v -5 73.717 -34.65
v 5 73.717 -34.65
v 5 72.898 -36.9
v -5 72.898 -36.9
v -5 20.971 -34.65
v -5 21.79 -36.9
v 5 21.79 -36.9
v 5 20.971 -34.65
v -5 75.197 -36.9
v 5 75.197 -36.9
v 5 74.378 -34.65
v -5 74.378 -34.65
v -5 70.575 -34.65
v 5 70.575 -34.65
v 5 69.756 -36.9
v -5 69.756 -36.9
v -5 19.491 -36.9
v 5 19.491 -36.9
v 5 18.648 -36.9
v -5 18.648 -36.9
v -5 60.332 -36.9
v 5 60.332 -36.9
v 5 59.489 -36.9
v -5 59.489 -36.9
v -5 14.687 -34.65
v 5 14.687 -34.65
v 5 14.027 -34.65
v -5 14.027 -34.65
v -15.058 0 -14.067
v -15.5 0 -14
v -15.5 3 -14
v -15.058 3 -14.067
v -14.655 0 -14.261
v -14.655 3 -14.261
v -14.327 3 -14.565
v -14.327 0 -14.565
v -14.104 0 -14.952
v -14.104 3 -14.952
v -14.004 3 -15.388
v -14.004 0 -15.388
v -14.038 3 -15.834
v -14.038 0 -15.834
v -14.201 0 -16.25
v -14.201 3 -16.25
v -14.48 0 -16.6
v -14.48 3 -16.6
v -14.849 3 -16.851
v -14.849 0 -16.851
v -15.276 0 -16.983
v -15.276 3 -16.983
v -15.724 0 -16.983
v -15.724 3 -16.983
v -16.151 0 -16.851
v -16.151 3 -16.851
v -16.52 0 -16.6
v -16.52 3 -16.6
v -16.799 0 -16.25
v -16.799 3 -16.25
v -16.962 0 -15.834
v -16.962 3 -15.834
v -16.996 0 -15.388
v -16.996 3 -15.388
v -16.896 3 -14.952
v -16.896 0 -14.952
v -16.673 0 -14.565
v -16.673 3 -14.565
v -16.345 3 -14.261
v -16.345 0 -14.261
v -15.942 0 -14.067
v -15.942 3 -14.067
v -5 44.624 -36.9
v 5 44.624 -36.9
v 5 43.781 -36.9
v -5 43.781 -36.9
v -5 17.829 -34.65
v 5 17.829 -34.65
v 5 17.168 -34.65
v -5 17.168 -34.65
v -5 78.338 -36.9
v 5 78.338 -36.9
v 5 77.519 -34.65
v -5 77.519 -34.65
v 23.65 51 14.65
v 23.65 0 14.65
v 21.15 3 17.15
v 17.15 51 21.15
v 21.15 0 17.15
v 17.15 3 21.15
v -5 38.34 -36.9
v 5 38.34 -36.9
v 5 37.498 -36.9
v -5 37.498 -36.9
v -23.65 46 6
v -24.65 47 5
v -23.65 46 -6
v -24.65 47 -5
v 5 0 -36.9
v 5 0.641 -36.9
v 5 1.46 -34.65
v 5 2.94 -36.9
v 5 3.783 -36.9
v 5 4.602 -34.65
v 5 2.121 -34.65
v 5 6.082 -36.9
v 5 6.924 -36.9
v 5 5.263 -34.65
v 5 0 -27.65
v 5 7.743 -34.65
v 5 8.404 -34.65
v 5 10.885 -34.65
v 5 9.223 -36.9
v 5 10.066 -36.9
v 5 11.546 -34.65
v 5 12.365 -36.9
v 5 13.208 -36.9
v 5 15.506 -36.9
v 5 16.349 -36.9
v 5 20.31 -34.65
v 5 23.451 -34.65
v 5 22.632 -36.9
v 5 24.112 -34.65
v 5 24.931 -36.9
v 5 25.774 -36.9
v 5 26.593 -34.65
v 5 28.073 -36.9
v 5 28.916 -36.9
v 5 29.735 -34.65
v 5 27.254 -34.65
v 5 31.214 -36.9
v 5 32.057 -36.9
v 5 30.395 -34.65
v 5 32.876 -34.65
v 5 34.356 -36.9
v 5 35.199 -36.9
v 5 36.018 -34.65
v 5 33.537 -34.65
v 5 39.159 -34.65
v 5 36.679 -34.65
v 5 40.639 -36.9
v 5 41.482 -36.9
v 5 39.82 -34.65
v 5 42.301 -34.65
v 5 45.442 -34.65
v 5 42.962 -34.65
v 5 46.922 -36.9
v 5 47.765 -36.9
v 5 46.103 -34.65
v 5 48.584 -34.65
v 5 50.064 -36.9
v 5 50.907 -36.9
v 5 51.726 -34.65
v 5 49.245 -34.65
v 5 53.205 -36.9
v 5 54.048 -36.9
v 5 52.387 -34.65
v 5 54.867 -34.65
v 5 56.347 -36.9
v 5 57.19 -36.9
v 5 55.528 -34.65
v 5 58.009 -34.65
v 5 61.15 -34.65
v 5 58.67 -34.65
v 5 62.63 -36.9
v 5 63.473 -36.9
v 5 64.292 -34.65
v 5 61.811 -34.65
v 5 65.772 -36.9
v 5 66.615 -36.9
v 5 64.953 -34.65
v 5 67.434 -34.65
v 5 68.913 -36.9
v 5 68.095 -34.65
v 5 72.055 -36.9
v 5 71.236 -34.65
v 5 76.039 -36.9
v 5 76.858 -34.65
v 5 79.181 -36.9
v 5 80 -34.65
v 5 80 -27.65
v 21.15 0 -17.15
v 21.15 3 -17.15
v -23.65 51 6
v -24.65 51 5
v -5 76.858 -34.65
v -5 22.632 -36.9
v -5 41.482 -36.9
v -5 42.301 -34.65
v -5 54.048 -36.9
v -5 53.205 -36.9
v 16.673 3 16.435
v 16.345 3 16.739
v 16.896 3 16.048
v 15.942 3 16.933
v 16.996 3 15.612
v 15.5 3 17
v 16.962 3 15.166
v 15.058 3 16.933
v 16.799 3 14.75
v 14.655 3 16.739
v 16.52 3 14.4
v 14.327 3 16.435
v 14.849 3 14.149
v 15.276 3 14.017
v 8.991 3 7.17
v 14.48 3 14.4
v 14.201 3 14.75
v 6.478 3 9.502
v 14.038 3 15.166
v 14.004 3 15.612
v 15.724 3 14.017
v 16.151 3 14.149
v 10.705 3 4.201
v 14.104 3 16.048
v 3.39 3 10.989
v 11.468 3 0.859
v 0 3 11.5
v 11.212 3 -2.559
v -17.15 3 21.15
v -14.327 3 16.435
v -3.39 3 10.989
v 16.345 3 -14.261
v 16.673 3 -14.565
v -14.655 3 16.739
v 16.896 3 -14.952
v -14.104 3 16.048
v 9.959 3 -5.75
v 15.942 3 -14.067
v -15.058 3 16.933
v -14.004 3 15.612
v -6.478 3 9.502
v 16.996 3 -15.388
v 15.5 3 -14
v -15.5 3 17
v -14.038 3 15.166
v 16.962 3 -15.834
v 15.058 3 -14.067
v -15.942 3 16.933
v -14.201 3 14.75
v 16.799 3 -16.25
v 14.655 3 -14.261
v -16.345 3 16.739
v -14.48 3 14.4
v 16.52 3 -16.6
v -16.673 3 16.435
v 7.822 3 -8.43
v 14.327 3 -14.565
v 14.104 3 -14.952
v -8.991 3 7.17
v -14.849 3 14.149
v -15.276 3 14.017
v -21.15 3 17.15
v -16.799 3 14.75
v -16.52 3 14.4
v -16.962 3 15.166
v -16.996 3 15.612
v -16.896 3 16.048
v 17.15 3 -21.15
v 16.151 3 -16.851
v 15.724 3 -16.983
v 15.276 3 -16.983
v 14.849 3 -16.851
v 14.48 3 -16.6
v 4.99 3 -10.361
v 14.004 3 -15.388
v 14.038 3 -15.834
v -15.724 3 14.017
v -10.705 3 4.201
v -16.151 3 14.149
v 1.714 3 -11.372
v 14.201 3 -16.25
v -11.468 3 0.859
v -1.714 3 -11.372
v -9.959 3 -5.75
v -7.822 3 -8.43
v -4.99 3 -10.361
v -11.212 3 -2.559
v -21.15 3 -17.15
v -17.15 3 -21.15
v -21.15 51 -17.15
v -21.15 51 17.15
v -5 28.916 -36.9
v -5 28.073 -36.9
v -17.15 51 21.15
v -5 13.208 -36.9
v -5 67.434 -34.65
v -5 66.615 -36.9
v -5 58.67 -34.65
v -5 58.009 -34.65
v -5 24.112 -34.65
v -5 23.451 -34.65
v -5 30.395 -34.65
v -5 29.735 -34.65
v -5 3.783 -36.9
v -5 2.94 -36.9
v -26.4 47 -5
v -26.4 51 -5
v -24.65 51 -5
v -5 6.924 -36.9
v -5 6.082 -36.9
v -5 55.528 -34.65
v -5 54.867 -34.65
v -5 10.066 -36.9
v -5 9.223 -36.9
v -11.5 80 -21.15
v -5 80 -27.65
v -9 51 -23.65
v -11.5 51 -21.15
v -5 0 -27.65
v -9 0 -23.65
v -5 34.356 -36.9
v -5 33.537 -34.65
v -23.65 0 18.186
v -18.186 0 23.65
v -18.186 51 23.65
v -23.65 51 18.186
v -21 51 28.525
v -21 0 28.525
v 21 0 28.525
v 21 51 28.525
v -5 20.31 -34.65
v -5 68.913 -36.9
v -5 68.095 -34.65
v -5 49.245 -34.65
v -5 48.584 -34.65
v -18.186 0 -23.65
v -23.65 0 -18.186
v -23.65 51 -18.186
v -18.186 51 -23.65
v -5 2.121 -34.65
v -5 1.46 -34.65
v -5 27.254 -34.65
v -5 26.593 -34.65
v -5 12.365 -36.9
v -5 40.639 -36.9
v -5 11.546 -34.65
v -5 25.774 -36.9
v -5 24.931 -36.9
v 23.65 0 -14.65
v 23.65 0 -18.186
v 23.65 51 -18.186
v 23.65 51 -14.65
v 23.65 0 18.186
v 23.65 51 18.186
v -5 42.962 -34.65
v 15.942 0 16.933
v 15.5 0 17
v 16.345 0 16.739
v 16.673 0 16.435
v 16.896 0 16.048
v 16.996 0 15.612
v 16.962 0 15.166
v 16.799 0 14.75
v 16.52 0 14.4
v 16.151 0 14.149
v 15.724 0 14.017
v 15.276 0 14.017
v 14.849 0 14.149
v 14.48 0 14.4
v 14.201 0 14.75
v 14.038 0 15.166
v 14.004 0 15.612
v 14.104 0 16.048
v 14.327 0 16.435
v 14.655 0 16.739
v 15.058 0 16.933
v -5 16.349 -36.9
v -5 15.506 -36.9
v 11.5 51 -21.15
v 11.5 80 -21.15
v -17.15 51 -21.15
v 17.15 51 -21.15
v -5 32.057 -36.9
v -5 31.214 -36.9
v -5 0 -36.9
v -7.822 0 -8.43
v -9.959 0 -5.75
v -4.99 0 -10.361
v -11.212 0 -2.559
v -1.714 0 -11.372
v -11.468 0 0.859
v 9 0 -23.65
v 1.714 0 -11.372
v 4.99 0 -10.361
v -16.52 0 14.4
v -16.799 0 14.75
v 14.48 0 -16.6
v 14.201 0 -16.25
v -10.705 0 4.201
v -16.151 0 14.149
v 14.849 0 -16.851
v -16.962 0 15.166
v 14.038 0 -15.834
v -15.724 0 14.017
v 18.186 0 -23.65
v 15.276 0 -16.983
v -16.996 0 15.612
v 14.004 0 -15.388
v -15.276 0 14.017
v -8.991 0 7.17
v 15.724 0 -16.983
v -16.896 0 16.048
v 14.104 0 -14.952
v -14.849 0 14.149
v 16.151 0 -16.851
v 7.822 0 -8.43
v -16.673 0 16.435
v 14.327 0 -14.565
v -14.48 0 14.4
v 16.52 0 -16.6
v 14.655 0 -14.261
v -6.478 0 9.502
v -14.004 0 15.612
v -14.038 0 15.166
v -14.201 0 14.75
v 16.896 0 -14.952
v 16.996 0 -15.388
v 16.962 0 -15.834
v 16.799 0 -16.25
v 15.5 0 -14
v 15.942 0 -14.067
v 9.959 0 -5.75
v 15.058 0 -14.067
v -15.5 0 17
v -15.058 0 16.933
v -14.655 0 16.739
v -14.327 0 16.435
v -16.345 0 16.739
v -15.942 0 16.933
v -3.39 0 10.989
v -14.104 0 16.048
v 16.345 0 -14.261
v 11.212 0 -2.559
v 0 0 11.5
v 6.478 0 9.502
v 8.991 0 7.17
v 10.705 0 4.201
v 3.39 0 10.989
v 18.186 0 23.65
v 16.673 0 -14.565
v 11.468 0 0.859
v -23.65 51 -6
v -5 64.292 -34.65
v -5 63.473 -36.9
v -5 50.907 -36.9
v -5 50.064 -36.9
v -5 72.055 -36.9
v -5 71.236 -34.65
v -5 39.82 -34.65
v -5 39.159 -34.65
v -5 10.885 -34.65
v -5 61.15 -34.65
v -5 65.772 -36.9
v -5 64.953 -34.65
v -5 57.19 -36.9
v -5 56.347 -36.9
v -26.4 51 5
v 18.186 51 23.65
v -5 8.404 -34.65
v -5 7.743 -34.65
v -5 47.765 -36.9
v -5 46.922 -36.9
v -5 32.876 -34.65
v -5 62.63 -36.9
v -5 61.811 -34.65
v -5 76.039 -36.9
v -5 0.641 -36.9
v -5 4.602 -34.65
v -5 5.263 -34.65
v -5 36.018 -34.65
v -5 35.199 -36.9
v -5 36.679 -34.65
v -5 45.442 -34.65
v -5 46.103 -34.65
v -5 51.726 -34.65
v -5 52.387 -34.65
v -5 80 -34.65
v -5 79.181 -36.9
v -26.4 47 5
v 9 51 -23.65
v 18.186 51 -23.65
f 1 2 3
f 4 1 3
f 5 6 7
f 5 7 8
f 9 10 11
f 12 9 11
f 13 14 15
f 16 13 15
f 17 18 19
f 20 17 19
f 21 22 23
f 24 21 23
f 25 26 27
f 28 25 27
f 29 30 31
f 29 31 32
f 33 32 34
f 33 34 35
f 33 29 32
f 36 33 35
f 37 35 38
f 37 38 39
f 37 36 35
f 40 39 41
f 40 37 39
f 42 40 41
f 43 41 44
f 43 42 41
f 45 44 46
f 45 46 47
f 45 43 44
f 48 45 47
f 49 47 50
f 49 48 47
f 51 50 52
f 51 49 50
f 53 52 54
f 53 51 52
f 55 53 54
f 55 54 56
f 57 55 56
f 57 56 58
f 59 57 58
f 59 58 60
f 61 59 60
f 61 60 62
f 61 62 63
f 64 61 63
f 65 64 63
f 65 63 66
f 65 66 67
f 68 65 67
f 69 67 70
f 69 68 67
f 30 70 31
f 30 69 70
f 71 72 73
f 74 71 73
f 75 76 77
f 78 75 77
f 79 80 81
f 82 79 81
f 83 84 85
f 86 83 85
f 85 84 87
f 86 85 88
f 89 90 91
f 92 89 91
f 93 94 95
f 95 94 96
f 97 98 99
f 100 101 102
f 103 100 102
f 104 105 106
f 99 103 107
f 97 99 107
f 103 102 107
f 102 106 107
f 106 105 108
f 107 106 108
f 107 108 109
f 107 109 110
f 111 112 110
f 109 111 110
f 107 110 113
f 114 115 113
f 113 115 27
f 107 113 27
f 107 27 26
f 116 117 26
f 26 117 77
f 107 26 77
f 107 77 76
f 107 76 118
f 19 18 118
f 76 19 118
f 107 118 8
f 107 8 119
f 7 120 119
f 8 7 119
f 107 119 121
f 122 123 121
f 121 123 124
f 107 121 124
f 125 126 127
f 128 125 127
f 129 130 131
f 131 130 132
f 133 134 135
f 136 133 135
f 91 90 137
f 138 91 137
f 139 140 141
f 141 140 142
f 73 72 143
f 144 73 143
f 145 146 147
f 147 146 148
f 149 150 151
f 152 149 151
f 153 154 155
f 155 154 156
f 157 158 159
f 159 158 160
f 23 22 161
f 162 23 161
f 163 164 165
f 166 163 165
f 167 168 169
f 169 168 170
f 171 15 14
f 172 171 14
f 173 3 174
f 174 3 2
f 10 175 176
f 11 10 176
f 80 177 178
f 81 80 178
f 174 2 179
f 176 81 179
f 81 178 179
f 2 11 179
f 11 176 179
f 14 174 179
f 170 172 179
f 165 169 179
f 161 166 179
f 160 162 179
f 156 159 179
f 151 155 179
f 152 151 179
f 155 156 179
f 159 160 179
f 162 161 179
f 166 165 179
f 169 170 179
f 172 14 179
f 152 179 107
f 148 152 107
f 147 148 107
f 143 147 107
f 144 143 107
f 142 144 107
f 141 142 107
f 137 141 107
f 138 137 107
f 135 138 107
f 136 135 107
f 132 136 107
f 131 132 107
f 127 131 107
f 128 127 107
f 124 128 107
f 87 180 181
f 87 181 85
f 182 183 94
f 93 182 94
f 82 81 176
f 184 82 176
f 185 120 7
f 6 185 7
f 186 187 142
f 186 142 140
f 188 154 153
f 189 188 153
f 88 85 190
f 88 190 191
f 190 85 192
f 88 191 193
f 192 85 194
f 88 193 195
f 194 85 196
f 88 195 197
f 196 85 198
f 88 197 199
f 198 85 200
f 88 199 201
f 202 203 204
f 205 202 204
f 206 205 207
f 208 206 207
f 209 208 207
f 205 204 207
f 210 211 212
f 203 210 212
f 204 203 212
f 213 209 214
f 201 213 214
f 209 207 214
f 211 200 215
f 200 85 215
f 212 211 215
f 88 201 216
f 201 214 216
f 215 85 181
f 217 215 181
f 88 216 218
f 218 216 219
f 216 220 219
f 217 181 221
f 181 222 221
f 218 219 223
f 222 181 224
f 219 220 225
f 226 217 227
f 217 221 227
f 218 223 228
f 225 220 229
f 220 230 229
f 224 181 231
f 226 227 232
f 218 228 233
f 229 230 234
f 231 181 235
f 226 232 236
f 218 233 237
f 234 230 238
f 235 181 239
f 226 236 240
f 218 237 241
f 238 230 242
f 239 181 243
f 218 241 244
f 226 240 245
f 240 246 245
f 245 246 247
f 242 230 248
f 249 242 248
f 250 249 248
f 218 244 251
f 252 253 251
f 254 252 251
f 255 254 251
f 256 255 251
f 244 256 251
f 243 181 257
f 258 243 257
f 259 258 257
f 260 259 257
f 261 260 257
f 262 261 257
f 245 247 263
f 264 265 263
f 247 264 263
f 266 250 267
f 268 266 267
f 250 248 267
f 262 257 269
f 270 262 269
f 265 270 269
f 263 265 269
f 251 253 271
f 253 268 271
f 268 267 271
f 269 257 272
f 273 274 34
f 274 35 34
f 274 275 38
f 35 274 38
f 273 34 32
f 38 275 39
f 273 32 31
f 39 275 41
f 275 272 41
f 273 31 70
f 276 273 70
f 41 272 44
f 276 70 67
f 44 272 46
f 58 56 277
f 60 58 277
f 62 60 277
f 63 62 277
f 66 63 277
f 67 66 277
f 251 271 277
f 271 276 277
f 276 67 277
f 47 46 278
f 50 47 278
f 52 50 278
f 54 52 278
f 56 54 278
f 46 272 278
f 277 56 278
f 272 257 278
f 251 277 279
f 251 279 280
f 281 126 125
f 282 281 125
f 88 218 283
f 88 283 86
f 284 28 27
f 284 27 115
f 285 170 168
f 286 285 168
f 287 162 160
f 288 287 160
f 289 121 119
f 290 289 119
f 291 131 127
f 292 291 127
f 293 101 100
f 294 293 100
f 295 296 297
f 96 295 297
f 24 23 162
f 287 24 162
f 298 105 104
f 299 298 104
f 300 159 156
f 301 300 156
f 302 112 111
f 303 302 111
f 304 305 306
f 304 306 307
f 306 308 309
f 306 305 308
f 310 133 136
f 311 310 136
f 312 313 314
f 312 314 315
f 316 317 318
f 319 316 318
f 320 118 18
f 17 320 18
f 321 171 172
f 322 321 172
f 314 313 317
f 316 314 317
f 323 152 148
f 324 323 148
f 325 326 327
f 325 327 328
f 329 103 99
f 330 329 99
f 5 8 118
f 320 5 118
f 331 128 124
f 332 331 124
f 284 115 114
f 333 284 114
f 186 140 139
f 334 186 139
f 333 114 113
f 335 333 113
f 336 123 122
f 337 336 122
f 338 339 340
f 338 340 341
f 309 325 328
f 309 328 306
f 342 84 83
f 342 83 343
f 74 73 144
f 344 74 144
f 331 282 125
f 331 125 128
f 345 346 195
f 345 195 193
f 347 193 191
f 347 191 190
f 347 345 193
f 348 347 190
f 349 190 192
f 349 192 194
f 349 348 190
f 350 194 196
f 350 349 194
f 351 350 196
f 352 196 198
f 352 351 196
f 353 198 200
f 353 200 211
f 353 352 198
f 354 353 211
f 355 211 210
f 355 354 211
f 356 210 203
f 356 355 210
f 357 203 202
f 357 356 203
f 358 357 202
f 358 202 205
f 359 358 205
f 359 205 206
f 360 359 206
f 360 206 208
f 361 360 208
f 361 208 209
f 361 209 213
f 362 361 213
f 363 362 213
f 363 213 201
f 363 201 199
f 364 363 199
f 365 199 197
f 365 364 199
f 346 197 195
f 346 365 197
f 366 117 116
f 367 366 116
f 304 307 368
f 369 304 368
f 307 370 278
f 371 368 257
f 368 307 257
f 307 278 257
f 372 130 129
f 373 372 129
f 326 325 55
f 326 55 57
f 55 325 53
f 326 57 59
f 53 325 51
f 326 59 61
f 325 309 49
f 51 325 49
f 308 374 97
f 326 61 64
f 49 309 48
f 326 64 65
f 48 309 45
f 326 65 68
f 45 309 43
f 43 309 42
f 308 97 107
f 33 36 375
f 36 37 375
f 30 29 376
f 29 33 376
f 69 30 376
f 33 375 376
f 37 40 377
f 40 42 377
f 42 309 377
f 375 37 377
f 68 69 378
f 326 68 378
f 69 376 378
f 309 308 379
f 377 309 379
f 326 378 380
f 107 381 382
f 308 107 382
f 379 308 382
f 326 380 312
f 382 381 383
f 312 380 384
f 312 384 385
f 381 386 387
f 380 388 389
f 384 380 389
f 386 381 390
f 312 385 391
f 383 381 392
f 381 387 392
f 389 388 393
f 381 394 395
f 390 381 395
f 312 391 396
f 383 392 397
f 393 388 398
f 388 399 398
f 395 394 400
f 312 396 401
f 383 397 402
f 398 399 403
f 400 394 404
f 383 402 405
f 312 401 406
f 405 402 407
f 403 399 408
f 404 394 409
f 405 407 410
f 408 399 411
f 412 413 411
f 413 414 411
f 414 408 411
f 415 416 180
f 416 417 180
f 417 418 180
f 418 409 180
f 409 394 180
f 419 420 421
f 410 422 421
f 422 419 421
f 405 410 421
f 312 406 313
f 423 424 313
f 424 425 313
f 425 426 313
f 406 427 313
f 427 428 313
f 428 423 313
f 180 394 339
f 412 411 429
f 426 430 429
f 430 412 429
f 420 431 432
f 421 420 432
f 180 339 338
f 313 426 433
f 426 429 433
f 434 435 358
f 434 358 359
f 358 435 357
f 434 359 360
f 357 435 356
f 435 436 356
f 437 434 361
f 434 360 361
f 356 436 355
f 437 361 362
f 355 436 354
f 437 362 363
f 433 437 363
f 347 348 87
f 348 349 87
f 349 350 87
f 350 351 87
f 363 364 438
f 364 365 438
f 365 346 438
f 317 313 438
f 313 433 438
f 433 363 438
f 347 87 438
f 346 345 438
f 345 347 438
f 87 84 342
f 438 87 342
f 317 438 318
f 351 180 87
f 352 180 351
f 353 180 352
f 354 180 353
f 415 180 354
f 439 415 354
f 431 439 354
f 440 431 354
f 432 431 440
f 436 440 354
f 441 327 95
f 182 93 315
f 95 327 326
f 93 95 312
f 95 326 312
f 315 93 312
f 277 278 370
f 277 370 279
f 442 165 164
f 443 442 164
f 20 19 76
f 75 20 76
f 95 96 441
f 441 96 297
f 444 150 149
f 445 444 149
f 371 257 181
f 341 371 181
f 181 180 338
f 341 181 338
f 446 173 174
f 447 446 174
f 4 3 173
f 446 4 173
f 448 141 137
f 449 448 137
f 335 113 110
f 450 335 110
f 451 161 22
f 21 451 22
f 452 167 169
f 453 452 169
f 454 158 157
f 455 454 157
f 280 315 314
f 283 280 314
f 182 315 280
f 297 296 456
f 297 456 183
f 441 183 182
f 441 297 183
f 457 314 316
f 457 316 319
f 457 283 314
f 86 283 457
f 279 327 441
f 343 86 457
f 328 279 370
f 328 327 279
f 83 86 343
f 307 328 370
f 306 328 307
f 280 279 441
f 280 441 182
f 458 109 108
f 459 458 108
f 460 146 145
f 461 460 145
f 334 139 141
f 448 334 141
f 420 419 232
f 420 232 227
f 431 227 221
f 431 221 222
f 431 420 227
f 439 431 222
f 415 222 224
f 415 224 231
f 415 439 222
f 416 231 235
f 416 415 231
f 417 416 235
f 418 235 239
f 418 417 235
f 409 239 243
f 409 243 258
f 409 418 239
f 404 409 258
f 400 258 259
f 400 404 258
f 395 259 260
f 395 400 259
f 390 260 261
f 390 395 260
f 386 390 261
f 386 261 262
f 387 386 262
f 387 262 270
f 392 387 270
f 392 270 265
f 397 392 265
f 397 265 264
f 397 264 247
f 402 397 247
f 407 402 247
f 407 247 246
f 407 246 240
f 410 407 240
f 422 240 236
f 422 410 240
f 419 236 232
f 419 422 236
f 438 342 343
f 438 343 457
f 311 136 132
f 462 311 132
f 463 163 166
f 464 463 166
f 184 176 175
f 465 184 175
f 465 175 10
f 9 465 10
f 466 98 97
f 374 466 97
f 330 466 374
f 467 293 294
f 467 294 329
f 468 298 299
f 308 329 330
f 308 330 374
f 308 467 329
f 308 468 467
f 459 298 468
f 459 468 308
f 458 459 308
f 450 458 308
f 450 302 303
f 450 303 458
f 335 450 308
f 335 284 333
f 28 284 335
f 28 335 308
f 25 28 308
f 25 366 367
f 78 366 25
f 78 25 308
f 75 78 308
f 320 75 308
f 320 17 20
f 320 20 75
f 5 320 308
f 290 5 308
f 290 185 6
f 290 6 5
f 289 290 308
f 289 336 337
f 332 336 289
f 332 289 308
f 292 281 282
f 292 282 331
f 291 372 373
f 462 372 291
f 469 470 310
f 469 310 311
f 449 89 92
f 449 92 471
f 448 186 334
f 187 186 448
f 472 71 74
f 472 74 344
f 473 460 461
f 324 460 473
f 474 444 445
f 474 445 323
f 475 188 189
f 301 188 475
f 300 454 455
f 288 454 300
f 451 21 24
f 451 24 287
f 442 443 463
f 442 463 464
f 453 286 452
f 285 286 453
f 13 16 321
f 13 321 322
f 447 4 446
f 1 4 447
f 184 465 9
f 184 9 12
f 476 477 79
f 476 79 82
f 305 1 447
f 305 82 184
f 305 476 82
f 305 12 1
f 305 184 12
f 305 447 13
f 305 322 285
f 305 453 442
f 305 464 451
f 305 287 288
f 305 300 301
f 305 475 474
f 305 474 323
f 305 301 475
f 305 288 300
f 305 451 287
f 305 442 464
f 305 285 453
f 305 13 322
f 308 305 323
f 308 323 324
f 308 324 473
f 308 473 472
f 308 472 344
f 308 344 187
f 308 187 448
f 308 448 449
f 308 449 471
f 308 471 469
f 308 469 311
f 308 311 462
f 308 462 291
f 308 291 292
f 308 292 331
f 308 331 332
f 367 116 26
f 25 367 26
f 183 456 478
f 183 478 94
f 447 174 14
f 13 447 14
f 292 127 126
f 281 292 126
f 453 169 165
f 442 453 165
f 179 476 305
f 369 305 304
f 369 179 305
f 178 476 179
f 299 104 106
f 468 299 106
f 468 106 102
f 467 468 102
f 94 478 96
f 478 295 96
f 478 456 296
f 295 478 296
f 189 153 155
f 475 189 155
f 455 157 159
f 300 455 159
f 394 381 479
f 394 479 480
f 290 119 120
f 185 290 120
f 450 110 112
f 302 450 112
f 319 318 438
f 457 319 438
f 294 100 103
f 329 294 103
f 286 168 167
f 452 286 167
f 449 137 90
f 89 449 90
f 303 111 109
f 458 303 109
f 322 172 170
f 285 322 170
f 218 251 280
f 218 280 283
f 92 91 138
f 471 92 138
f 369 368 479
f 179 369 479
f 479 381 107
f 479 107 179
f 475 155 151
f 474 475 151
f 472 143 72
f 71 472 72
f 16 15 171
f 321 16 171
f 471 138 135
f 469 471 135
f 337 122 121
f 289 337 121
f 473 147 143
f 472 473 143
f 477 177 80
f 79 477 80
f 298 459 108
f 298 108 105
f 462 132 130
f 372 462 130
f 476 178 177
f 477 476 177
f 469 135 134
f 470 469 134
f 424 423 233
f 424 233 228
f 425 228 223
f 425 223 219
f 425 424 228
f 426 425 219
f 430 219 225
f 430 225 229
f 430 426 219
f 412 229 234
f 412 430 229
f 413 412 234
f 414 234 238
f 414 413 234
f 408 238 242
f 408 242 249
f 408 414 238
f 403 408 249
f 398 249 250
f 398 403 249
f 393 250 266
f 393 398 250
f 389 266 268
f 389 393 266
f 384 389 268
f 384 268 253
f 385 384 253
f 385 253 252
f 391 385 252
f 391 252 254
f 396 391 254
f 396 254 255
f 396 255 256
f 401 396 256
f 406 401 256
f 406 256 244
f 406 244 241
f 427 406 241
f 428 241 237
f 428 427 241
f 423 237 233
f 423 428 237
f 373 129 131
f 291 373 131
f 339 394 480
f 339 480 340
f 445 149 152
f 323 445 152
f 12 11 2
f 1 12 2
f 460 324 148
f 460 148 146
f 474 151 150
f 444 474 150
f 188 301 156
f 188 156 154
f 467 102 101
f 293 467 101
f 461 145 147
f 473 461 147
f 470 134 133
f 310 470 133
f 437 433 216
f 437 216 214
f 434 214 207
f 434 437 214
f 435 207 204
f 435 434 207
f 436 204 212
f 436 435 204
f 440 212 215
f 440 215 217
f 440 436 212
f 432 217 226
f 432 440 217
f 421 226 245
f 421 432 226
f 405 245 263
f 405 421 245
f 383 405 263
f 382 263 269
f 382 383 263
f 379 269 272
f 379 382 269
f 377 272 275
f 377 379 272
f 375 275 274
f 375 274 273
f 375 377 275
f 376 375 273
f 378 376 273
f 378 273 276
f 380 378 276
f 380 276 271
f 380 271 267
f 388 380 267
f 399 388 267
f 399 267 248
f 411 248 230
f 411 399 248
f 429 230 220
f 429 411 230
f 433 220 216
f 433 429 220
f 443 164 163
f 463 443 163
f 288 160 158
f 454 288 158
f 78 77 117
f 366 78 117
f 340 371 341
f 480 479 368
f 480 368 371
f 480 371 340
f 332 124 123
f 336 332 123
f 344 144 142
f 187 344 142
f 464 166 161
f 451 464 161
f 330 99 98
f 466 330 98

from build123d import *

# Parameters (mm, degrees)
SKETCH1_R           = 1.5
SKETCH1_R_2         = 11.5
BOSS_EXTRUDE1_DEPTH = 3
BOSS_EXTRUDE2_DEPTH = 51
BOSS_EXTRUDE3_DEPTH = 51
SKETCH11_W          = 1
SKETCH11_H          = 51
BOSS_EXTRUDE4_DEPTH = 5
BOSS_EXTRUDE6_DEPTH = 10
CHAMFER1_SIZE       = 4
BOSS_EXTRUDE7_DEPTH = 29
SKETCH16_W          = 2.75
SKETCH16_H          = 10
BOSS_EXTRUDE8_DEPTH = 4
CHAMFER2_SIZE       = 1
CHAMFER3_SIZE       = 1


with BuildPart() as part:
    # Sketch1 → Boss-Extrude1 (new body)
    with BuildSketch(Plane(origin=(0, 0, 0), x_dir=(1, 0, 0), z_dir=(0, 1, 0))):
        Polygon((-21.15, 17.15), (-17.15, 21.15), (17.15, 21.15), (21.15, 17.15), (21.15, -17.15), (17.15, -21.15), (-17.15, -21.15), (-21.15, -17.15), align=None)
        with Locations(Location((-15.5, 15.5, 0), (0, 0, 270))):
            Circle(SKETCH1_R, mode=Mode.SUBTRACT)
        with Locations(Location((15.5, 15.5, 0), (0, 0, 270))):
            Circle(SKETCH1_R, mode=Mode.SUBTRACT)
        with Locations(Location((15.5, -15.5, 0), (0, 0, 270))):
            Circle(SKETCH1_R, mode=Mode.SUBTRACT)
        with Locations(Location((-15.5, -15.5, 0), (0, 0, 270))):
            Circle(SKETCH1_R, mode=Mode.SUBTRACT)
        with Locations(Location((0, 0, 0), (0, 0, 270))):
            Circle(SKETCH1_R_2, mode=Mode.SUBTRACT)
    extrude(amount=BOSS_EXTRUDE1_DEPTH)

    # Sketch5 → Boss-Extrude2 (add)
    with BuildSketch(Plane(origin=(0, 0, 0), x_dir=(1, 0, 0), z_dir=(0, 1, 0))):
        Polygon((21.15, -17.15), (23.65, -14.65), (23.65, -18.185533906), (18.185533906, -23.65), (-18.185533906, -23.65), (-23.65, -18.185533906), (-23.65, 14.65), (-23.65, 18.185533906), (-18.185533906, 23.65), (18.185533906, 23.65), (23.65, 18.185533906), (23.65, 14.65), (21.15, 17.15), (17.15, 21.15), (-17.15, 21.15), (-21.15, 17.15), (-21.15, -17.15), (-17.15, -21.15), (17.15, -21.15), align=None)
    extrude(amount=BOSS_EXTRUDE2_DEPTH)

    # Sketch9 → Boss-Extrude3 (add)
    with BuildSketch(Plane(origin=(0, 0, 0), x_dir=(1, 0, 0), z_dir=(0, 1, 0))):
        Polygon((-18.185533906, -23.65), (-21, -28.524798271), (21, -28.524798271), (18.185533906, -23.65), align=None)
    extrude(amount=BOSS_EXTRUDE3_DEPTH)

    # Sketch11 → Boss-Extrude4 (add, symmetric)
    with BuildSketch(Plane(origin=(0, 0, 0), x_dir=(0, 0, -1), z_dir=(1, 0, 0))):
        with Locations((24.15, 25.5)):
            Rectangle(SKETCH11_W, SKETCH11_H)
    extrude(amount=BOSS_EXTRUDE4_DEPTH, both=True)

    # Sketch13 → Boss-Extrude6 (add)
    with BuildSketch(Plane(origin=(5, 0, 0), x_dir=(0, 0, -1), z_dir=(1, 0, 0))):
        Polygon((24.65, 80), (34.65, 80), (36.9, 79.181067), (36.9, 78.3382111), (34.65, 77.5192781), (34.65, 76.8584073), (36.9, 76.0394743), (36.9, 75.1966185), (34.65, 74.3776854), (34.65, 73.7168147), (36.9, 72.8978817), (36.9, 72.0550258), (34.65, 71.2360928), (34.65, 70.575222), (36.9, 69.756289), (36.9, 68.9134332), (34.65, 68.0945001), (34.65, 67.4336294), (36.9, 66.6146964), (36.9, 65.7718405), (34.65, 64.9529075), (34.65, 64.2920367), (36.9, 63.4731037), (36.9, 62.6302478), (34.65, 61.8113148), (34.65, 61.1504441), (36.9, 60.3315111), (36.9, 59.4886552), (34.65, 58.6697222), (34.65, 58.0088514), (36.9, 57.1899184), (36.9, 56.3470625), (34.65, 55.5281295), (34.65, 54.8672588), (36.9, 54.0483257), (36.9, 53.2054699), (34.65, 52.3865369), (34.65, 51.7256661), (36.9, 50.9067331), (36.9, 50.0638772), (34.65, 49.2449442), (34.65, 48.5840735), (36.9, 47.7651404), (36.9, 46.9222846), (34.65, 46.1033516), (34.65, 45.4424808), (36.9, 44.6235478), (36.9, 43.7806919), (34.65, 42.9617589), (34.65, 42.3008882), (36.9, 41.4819551), (36.9, 40.6390993), (34.65, 39.8201662), (34.65, 39.1592955), (36.9, 38.3403625), (36.9, 37.4975066), (34.65, 36.6785736), (34.65, 36.0177028), (36.9, 35.1987698), (36.9, 34.355914), (34.65, 33.5369809), (34.65, 32.8761102), (36.9, 32.0571772), (36.9, 31.2143213), (34.65, 30.3953883), (34.65, 29.7345175), (36.9, 28.9155845), (36.9, 28.0727287), (34.65, 27.2537956), (34.65, 26.5929249), (36.9, 25.7739919), (36.9, 24.931136), (34.65, 24.112203), (34.65, 23.4513322), (36.9, 22.6323992), (36.9, 21.7895434), (34.65, 20.9706103), (34.65, 20.3097396), (36.9, 19.4908066), (36.9, 18.6479507), (34.65, 17.8290177), (34.65, 17.1681469), (36.9, 16.3492139), (36.9, 15.506358), (34.65, 14.687425), (34.65, 14.0265543), (36.9, 13.2076212), (36.9, 12.3647654), (34.65, 11.5458324), (34.65, 10.8849616), (36.9, 10.0660286), (36.9, 9.2231727), (34.65, 8.4042397), (34.65, 7.743369), (36.9, 6.9244359), (36.9, 6.0815801), (34.65, 5.2626471), (34.65, 4.6017763), (36.9, 3.7828433), (36.9, 2.9399874), (34.65, 2.1210544), (34.65, 1.4601837), (36.9, 0.6412506), (36.9, 0), (24.65, 0), align=None)
    extrude(amount=-BOSS_EXTRUDE6_DEPTH)

    # Chamfer1
    chamfer1_edges = [part.edges().sort_by_distance(p)[0] for p in [
        (5, 25.5, -23.65),
    ]]
    chamfer(chamfer1_edges, length=CHAMFER1_SIZE)
    chamfer1_2_edges = [part.edges().sort_by_distance(p)[0] for p in [
        (-5, 25.5, -23.65),
    ]]
    chamfer(chamfer1_2_edges, length=CHAMFER1_SIZE)

    # Sketch15 → Boss-Extrude7 (add)
    with BuildSketch(Plane(origin=(0, 51, 0), x_dir=(1, 0, 0), z_dir=(0, 1, 0))):
        Polygon((-8, 24.65), (-11.5, 21.15), (11.5, 21.15), (8, 24.65), align=None)
    extrude(amount=BOSS_EXTRUDE7_DEPTH)

    # Sketch16 → Boss-Extrude8 (add)
    with BuildSketch(Plane(origin=(0, 51, 0), x_dir=(1, 0, 0), z_dir=(0, 1, 0))):
        with Locations((-25.025, 0)):
            Rectangle(SKETCH16_W, SKETCH16_H)
    extrude(amount=-BOSS_EXTRUDE8_DEPTH)

    # Chamfer2
    chamfer2_edges = [part.edges().sort_by_distance(p)[0] for p in [
        (-23.65, 47, 0),
    ]]
    chamfer(chamfer2_edges, length=CHAMFER2_SIZE)

    # Chamfer3
    chamfer3_edges = [part.edges().sort_by_distance(p)[0] for p in [
        (-23.65, 48.5, -5),
        (-23.65, 48.5, 5),
    ]]
    chamfer(chamfer3_edges, length=CHAMFER3_SIZE)


solid = part.part
